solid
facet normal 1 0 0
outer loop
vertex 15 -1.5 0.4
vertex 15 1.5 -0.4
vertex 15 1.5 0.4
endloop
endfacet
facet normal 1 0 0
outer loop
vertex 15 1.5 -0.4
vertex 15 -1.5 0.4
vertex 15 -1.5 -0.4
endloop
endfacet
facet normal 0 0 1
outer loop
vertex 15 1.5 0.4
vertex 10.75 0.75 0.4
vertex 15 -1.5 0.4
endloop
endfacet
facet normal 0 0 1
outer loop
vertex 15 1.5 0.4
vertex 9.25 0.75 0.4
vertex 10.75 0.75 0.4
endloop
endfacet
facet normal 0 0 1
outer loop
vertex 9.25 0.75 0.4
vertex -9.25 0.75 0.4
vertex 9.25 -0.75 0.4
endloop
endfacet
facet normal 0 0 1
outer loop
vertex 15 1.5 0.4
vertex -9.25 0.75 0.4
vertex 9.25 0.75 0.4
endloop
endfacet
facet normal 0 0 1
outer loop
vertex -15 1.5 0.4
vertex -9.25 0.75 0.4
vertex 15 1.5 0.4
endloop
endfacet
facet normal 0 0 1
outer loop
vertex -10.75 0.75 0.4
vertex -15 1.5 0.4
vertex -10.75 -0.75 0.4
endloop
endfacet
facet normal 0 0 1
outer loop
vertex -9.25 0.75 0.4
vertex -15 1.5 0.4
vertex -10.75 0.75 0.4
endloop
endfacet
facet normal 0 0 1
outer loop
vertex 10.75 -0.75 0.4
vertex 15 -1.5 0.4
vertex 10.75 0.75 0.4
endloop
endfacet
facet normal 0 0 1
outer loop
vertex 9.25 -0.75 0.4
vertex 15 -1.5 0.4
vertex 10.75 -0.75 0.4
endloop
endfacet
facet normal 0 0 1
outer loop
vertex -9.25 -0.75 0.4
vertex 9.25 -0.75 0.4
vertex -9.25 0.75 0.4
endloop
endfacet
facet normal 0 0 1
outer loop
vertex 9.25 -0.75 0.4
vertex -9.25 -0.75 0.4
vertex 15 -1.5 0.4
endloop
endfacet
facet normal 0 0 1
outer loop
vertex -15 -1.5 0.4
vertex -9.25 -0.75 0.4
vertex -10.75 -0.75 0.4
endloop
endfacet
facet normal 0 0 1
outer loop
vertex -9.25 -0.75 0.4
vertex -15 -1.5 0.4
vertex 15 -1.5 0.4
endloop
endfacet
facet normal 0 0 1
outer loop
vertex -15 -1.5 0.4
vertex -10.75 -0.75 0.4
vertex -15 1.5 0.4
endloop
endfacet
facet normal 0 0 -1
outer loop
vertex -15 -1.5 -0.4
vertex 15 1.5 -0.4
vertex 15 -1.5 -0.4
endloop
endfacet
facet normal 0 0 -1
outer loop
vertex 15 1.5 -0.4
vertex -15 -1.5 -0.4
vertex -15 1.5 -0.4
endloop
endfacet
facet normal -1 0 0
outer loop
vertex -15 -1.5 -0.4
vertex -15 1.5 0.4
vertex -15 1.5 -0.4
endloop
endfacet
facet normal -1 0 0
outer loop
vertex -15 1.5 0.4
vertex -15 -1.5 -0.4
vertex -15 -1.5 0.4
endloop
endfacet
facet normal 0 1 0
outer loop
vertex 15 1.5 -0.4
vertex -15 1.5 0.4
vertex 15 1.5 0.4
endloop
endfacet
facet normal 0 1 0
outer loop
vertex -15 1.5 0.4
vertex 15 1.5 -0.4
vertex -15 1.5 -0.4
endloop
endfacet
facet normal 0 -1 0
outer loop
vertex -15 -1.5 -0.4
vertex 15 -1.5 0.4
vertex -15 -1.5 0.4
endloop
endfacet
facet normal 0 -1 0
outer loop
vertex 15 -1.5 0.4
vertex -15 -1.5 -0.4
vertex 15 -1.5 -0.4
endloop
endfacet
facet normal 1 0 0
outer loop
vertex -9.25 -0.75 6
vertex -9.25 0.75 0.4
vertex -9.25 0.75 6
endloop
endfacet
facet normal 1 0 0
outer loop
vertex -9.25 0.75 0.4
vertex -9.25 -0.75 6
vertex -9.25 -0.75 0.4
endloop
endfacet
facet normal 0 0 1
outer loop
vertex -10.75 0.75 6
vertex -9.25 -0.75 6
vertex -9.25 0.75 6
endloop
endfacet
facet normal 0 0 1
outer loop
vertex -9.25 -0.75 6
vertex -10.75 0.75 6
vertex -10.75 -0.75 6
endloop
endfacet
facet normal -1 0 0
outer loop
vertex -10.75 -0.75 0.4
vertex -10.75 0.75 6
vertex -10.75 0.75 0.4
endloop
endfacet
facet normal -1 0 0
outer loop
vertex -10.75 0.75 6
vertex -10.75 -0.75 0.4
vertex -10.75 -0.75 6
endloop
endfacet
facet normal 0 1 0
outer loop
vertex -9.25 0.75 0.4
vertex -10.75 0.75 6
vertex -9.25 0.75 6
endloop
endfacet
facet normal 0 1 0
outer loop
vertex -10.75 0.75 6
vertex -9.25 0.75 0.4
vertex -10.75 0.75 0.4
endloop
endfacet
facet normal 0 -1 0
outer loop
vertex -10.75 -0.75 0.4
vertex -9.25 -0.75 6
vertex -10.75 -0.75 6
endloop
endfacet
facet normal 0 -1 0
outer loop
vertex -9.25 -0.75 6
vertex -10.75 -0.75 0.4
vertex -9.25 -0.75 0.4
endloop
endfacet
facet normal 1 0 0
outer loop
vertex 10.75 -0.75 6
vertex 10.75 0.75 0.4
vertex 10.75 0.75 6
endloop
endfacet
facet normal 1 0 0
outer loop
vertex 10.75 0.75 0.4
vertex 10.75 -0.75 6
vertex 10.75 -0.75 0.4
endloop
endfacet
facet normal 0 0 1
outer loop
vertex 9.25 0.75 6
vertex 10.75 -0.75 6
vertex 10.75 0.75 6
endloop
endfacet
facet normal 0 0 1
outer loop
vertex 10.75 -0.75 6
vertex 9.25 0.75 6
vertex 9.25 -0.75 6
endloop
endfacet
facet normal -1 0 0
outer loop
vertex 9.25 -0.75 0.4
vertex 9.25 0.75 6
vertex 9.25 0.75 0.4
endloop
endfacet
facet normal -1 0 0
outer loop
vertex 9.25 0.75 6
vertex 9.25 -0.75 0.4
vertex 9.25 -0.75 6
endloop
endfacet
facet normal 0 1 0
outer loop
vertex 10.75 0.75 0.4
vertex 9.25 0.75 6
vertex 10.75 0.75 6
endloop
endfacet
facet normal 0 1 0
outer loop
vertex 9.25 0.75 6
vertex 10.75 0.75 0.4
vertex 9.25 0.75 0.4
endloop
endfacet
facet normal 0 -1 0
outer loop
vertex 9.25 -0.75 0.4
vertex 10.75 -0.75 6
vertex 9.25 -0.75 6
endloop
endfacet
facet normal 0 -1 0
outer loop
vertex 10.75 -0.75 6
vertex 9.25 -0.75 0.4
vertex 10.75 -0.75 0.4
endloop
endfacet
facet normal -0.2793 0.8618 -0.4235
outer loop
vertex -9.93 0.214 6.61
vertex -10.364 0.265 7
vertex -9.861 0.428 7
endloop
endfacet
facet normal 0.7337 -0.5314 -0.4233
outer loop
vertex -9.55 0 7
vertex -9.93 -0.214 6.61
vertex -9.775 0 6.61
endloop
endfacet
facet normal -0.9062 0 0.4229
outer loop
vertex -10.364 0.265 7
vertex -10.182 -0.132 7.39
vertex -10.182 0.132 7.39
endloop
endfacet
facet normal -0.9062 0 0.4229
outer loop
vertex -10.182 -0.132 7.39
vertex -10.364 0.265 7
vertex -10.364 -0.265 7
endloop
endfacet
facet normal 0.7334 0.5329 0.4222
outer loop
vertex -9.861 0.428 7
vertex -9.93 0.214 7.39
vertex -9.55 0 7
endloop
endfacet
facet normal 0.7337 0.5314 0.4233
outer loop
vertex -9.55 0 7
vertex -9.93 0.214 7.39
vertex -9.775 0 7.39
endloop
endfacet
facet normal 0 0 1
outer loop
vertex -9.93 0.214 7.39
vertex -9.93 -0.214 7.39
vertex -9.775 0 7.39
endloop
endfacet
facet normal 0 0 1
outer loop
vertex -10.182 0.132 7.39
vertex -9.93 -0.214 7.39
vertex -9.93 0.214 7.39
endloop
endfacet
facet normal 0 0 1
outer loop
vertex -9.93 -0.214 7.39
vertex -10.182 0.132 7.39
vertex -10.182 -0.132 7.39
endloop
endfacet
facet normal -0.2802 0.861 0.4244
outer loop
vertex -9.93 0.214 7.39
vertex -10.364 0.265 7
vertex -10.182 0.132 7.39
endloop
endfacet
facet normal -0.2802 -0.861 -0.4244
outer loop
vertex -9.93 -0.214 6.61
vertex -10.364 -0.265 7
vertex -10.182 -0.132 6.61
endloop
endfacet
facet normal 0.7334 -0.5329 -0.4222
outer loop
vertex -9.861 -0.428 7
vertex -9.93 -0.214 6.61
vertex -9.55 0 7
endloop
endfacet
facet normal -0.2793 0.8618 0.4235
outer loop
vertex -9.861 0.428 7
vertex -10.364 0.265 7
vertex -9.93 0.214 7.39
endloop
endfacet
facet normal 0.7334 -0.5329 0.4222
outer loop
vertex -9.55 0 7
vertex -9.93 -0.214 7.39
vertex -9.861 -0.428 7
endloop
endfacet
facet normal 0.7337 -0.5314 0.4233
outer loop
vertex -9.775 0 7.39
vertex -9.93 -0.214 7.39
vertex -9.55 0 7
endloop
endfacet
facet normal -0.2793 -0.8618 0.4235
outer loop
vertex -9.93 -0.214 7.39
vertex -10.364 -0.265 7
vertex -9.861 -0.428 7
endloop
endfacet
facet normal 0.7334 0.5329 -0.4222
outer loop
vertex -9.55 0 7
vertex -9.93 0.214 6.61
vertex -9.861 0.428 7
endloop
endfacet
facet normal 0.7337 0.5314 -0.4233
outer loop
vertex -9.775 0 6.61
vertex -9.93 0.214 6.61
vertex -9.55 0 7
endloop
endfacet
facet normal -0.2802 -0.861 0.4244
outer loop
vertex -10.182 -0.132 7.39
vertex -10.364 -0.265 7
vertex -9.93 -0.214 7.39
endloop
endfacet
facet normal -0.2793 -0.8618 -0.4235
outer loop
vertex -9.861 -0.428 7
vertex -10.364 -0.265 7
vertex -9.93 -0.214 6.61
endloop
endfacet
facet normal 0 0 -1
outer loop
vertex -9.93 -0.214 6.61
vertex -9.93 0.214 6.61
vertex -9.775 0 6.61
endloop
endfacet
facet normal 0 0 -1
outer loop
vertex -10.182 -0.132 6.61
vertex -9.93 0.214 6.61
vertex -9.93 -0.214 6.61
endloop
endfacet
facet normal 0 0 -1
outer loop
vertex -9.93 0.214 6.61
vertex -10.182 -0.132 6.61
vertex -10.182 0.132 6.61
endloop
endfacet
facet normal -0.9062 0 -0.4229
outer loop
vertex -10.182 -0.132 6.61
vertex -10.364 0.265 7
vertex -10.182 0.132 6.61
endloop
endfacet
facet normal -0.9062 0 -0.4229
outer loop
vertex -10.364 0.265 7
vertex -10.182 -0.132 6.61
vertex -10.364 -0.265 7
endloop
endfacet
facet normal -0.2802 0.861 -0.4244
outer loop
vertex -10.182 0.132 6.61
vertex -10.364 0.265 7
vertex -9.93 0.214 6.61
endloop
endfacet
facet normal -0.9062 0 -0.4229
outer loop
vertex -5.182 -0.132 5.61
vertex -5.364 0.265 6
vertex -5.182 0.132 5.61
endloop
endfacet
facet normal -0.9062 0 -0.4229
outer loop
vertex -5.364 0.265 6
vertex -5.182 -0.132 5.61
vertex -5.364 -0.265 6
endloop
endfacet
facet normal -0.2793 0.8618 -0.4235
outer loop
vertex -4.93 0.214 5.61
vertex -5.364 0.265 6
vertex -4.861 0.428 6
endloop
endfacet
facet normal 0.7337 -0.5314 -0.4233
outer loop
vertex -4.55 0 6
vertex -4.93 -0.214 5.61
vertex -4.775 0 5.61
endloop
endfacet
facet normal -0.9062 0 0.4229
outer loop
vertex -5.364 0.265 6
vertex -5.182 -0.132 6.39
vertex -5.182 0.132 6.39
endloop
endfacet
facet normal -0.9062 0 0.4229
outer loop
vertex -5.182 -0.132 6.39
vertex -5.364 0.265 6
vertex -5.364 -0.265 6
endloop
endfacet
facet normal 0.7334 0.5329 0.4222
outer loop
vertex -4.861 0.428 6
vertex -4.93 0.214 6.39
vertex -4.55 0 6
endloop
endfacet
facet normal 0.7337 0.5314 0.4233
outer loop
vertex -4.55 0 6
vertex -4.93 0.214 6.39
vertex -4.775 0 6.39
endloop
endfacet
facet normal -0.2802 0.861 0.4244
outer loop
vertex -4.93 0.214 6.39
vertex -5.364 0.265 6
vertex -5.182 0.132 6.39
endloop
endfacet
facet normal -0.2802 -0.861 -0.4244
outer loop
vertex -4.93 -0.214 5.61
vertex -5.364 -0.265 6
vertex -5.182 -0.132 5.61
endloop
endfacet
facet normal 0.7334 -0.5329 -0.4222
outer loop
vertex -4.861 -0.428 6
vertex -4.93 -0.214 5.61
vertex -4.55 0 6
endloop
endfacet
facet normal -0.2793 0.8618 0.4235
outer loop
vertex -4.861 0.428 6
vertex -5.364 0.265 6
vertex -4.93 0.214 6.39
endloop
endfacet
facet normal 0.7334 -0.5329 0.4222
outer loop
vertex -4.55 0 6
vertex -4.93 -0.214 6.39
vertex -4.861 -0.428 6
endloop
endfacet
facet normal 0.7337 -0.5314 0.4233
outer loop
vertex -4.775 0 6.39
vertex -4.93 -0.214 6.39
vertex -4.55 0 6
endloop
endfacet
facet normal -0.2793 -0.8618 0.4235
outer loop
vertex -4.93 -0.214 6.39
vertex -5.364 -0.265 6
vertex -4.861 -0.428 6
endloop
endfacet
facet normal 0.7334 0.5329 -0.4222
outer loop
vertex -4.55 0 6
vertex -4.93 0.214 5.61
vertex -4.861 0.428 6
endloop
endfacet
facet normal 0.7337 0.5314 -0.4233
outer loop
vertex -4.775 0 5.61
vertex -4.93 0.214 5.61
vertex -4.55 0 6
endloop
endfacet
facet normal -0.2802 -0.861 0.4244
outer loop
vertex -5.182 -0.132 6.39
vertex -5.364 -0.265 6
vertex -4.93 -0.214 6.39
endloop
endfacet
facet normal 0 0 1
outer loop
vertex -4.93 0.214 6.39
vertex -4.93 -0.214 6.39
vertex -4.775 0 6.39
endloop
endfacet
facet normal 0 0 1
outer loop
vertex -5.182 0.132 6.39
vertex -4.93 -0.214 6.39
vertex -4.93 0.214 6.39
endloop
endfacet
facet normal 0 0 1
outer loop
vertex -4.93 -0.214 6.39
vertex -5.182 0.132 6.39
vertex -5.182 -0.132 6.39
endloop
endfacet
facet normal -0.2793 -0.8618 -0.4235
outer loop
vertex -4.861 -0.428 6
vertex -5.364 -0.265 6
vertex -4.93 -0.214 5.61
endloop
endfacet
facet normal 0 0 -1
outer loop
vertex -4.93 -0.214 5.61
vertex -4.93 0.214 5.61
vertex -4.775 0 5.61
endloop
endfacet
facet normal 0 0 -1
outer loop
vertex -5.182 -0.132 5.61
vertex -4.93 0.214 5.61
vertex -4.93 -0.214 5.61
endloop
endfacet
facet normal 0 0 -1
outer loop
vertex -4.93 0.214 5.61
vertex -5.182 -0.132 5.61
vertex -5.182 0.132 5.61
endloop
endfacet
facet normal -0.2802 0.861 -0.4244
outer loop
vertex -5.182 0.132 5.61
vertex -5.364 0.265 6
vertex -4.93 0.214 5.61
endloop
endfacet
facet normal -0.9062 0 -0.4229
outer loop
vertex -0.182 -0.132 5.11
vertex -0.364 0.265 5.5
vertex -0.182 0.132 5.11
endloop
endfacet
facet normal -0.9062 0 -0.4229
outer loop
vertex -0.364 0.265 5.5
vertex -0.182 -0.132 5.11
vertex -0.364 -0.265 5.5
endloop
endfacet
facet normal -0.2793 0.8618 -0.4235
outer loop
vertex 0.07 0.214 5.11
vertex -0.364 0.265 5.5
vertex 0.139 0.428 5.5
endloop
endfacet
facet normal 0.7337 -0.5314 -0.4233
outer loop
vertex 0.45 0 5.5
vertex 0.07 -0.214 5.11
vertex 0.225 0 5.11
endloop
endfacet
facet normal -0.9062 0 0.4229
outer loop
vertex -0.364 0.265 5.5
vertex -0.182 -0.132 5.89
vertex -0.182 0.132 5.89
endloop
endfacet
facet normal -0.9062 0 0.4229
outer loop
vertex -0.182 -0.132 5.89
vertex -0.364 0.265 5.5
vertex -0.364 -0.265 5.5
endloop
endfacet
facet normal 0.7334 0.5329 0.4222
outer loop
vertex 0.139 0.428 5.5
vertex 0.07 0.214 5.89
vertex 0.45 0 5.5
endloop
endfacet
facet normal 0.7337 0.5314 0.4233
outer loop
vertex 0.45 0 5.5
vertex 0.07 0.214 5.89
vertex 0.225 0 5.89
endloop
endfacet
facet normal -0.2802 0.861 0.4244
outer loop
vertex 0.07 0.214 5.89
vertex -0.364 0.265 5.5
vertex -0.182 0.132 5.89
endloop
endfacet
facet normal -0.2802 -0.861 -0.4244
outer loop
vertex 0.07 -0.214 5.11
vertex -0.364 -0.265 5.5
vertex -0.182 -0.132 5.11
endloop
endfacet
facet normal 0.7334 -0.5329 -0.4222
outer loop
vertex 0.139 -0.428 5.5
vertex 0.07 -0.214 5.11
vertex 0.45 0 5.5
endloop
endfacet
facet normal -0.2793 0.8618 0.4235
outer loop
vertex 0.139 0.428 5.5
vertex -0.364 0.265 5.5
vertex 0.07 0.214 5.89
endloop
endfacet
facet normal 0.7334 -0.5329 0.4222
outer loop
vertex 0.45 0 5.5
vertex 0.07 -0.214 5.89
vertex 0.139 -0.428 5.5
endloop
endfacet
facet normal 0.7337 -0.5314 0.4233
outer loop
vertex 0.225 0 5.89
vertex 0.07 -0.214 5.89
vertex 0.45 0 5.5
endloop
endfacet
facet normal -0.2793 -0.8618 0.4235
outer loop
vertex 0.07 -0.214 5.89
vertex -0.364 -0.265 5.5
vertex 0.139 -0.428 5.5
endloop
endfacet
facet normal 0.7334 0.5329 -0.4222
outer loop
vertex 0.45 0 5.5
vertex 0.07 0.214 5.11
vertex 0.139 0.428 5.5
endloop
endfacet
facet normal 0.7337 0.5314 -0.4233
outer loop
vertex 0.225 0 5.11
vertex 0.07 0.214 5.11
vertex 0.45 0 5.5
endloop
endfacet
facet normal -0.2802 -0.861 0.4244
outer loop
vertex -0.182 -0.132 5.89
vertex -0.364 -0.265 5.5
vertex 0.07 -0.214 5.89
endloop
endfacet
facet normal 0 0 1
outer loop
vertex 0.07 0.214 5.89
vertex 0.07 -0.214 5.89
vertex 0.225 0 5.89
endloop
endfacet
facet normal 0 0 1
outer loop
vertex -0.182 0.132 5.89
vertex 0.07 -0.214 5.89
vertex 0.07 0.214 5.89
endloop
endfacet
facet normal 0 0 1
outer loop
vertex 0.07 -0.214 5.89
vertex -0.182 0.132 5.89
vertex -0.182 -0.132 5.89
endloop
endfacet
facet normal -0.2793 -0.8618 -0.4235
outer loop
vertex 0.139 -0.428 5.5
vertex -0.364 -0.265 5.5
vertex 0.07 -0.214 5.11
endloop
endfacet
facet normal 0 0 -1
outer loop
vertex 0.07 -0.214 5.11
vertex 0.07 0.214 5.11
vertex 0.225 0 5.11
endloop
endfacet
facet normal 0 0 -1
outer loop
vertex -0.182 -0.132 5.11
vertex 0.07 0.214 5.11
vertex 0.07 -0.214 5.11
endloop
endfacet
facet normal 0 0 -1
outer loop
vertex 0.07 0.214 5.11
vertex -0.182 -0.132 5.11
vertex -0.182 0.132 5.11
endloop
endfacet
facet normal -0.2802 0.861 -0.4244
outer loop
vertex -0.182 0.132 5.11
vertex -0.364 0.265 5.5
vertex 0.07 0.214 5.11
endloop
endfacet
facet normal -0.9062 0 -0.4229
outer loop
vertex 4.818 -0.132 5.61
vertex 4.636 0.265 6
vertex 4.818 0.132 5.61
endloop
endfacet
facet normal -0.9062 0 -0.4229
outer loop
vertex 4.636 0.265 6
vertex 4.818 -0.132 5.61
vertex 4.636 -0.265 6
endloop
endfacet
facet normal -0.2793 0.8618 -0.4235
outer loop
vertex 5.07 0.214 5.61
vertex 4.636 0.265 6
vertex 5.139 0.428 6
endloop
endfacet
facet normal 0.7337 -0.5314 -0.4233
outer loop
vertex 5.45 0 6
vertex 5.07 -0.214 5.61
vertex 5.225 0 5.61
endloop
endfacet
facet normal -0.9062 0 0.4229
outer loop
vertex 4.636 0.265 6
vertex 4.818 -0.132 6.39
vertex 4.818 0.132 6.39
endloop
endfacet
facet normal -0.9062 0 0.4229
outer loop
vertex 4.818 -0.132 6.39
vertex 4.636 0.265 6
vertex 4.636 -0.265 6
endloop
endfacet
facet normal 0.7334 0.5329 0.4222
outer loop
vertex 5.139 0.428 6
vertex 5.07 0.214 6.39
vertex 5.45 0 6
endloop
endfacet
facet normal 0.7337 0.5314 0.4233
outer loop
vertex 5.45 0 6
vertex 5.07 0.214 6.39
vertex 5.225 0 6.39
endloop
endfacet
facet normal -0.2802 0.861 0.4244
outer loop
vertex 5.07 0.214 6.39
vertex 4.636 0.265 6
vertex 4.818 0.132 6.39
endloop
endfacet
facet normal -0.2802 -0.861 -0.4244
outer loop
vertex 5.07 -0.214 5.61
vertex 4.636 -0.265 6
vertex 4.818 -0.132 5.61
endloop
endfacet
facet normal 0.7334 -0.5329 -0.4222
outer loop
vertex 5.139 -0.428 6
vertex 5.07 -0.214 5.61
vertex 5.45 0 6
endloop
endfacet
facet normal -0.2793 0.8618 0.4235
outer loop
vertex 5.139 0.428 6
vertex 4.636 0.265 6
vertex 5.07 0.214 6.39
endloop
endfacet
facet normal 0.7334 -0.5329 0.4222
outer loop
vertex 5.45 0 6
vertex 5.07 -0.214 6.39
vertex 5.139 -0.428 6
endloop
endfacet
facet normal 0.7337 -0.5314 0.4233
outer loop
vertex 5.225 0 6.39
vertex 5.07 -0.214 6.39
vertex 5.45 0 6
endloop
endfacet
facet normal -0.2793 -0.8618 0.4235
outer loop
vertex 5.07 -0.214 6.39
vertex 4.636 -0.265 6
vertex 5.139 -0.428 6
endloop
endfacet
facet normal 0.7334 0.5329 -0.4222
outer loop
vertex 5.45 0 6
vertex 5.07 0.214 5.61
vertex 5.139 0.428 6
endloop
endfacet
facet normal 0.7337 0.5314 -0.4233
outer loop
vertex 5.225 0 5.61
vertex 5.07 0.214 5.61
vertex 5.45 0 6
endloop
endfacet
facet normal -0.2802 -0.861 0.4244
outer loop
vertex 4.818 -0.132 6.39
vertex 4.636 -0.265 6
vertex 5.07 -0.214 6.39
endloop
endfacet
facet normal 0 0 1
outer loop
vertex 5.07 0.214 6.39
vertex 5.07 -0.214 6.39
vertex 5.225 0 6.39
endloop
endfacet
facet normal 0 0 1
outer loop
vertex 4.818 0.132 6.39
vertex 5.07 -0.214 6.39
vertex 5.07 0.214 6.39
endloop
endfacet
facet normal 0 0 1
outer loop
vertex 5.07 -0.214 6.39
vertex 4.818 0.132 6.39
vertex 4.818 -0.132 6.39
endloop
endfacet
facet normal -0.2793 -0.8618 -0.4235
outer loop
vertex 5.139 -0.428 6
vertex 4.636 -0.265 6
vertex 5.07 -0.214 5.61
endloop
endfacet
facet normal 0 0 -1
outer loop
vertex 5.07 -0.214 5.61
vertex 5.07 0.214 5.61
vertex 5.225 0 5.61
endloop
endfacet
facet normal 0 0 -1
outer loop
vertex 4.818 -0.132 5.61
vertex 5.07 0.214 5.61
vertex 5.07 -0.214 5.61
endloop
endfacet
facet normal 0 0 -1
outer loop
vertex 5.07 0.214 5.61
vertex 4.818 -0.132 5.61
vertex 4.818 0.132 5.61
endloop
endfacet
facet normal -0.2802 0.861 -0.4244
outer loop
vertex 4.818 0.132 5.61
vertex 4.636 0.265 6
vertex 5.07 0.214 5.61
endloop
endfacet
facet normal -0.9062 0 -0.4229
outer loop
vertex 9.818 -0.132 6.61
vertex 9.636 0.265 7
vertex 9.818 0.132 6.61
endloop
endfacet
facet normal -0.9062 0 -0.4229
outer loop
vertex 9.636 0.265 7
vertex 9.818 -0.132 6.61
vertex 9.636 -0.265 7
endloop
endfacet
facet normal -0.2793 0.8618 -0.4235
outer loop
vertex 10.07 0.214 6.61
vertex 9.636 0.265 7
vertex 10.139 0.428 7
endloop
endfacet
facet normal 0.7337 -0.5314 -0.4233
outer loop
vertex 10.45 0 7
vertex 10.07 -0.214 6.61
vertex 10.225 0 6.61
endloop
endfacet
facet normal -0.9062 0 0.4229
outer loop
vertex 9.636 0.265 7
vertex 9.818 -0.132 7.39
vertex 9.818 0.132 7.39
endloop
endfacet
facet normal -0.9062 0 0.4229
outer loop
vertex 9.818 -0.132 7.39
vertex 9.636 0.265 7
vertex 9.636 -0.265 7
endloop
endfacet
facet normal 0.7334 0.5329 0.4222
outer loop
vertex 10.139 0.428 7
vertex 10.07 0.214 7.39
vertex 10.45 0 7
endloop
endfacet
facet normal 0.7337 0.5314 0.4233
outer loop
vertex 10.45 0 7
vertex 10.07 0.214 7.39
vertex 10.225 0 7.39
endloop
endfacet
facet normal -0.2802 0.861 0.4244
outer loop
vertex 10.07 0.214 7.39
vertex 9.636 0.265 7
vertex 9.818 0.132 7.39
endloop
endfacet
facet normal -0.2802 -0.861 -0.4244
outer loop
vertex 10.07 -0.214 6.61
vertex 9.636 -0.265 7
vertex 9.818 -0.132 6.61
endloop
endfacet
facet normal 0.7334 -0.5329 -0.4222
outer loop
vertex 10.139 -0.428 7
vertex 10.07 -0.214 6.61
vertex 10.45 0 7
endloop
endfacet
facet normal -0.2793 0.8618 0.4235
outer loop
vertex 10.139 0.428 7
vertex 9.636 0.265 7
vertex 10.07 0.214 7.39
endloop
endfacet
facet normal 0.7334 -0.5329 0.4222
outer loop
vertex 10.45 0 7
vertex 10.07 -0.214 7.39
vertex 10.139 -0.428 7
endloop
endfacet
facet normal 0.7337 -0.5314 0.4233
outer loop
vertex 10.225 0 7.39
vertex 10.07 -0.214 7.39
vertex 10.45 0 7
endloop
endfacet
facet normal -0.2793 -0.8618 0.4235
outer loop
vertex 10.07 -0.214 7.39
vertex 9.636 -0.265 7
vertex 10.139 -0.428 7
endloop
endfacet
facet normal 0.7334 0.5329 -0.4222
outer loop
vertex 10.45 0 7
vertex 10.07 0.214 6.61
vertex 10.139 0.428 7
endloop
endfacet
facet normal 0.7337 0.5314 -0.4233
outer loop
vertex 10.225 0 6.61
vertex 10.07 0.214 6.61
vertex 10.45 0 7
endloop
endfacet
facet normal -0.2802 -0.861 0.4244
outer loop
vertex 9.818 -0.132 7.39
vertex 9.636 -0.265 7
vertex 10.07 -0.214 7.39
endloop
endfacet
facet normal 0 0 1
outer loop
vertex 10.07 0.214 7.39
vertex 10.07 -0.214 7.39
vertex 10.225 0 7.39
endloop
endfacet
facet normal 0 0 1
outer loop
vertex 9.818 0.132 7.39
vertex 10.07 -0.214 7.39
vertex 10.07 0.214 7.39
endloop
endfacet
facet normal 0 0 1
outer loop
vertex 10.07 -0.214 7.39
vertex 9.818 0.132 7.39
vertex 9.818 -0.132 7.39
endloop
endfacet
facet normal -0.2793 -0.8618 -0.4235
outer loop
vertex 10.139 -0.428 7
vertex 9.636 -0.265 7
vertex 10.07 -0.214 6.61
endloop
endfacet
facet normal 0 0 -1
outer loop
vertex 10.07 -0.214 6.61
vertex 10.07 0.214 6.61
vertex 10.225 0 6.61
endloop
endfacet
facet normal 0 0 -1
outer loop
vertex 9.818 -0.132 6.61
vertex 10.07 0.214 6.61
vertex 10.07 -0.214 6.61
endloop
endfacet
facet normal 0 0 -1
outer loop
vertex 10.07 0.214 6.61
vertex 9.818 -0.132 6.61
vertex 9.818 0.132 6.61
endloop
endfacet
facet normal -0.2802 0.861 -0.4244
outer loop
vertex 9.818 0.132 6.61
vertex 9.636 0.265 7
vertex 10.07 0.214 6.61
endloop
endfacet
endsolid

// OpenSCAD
module tower(x=0) {
  translate([x,0,3])
    cube([1.5,1.5,6], center=true);
}

module cable_post(x=0, z=7) {
  translate([x,0,z])
    sphere(r=0.45);
}

module suspension_bridge() {
  union() {
    cube([30,3,0.8], center=true);
    tower(-10);
    tower(10);
    cable_post(-10,7);
    cable_post(-5,6);
    cable_post(0,5.5);
    cable_post(5,6);
    cable_post(10,7);
  }
}

suspension_bridge();
